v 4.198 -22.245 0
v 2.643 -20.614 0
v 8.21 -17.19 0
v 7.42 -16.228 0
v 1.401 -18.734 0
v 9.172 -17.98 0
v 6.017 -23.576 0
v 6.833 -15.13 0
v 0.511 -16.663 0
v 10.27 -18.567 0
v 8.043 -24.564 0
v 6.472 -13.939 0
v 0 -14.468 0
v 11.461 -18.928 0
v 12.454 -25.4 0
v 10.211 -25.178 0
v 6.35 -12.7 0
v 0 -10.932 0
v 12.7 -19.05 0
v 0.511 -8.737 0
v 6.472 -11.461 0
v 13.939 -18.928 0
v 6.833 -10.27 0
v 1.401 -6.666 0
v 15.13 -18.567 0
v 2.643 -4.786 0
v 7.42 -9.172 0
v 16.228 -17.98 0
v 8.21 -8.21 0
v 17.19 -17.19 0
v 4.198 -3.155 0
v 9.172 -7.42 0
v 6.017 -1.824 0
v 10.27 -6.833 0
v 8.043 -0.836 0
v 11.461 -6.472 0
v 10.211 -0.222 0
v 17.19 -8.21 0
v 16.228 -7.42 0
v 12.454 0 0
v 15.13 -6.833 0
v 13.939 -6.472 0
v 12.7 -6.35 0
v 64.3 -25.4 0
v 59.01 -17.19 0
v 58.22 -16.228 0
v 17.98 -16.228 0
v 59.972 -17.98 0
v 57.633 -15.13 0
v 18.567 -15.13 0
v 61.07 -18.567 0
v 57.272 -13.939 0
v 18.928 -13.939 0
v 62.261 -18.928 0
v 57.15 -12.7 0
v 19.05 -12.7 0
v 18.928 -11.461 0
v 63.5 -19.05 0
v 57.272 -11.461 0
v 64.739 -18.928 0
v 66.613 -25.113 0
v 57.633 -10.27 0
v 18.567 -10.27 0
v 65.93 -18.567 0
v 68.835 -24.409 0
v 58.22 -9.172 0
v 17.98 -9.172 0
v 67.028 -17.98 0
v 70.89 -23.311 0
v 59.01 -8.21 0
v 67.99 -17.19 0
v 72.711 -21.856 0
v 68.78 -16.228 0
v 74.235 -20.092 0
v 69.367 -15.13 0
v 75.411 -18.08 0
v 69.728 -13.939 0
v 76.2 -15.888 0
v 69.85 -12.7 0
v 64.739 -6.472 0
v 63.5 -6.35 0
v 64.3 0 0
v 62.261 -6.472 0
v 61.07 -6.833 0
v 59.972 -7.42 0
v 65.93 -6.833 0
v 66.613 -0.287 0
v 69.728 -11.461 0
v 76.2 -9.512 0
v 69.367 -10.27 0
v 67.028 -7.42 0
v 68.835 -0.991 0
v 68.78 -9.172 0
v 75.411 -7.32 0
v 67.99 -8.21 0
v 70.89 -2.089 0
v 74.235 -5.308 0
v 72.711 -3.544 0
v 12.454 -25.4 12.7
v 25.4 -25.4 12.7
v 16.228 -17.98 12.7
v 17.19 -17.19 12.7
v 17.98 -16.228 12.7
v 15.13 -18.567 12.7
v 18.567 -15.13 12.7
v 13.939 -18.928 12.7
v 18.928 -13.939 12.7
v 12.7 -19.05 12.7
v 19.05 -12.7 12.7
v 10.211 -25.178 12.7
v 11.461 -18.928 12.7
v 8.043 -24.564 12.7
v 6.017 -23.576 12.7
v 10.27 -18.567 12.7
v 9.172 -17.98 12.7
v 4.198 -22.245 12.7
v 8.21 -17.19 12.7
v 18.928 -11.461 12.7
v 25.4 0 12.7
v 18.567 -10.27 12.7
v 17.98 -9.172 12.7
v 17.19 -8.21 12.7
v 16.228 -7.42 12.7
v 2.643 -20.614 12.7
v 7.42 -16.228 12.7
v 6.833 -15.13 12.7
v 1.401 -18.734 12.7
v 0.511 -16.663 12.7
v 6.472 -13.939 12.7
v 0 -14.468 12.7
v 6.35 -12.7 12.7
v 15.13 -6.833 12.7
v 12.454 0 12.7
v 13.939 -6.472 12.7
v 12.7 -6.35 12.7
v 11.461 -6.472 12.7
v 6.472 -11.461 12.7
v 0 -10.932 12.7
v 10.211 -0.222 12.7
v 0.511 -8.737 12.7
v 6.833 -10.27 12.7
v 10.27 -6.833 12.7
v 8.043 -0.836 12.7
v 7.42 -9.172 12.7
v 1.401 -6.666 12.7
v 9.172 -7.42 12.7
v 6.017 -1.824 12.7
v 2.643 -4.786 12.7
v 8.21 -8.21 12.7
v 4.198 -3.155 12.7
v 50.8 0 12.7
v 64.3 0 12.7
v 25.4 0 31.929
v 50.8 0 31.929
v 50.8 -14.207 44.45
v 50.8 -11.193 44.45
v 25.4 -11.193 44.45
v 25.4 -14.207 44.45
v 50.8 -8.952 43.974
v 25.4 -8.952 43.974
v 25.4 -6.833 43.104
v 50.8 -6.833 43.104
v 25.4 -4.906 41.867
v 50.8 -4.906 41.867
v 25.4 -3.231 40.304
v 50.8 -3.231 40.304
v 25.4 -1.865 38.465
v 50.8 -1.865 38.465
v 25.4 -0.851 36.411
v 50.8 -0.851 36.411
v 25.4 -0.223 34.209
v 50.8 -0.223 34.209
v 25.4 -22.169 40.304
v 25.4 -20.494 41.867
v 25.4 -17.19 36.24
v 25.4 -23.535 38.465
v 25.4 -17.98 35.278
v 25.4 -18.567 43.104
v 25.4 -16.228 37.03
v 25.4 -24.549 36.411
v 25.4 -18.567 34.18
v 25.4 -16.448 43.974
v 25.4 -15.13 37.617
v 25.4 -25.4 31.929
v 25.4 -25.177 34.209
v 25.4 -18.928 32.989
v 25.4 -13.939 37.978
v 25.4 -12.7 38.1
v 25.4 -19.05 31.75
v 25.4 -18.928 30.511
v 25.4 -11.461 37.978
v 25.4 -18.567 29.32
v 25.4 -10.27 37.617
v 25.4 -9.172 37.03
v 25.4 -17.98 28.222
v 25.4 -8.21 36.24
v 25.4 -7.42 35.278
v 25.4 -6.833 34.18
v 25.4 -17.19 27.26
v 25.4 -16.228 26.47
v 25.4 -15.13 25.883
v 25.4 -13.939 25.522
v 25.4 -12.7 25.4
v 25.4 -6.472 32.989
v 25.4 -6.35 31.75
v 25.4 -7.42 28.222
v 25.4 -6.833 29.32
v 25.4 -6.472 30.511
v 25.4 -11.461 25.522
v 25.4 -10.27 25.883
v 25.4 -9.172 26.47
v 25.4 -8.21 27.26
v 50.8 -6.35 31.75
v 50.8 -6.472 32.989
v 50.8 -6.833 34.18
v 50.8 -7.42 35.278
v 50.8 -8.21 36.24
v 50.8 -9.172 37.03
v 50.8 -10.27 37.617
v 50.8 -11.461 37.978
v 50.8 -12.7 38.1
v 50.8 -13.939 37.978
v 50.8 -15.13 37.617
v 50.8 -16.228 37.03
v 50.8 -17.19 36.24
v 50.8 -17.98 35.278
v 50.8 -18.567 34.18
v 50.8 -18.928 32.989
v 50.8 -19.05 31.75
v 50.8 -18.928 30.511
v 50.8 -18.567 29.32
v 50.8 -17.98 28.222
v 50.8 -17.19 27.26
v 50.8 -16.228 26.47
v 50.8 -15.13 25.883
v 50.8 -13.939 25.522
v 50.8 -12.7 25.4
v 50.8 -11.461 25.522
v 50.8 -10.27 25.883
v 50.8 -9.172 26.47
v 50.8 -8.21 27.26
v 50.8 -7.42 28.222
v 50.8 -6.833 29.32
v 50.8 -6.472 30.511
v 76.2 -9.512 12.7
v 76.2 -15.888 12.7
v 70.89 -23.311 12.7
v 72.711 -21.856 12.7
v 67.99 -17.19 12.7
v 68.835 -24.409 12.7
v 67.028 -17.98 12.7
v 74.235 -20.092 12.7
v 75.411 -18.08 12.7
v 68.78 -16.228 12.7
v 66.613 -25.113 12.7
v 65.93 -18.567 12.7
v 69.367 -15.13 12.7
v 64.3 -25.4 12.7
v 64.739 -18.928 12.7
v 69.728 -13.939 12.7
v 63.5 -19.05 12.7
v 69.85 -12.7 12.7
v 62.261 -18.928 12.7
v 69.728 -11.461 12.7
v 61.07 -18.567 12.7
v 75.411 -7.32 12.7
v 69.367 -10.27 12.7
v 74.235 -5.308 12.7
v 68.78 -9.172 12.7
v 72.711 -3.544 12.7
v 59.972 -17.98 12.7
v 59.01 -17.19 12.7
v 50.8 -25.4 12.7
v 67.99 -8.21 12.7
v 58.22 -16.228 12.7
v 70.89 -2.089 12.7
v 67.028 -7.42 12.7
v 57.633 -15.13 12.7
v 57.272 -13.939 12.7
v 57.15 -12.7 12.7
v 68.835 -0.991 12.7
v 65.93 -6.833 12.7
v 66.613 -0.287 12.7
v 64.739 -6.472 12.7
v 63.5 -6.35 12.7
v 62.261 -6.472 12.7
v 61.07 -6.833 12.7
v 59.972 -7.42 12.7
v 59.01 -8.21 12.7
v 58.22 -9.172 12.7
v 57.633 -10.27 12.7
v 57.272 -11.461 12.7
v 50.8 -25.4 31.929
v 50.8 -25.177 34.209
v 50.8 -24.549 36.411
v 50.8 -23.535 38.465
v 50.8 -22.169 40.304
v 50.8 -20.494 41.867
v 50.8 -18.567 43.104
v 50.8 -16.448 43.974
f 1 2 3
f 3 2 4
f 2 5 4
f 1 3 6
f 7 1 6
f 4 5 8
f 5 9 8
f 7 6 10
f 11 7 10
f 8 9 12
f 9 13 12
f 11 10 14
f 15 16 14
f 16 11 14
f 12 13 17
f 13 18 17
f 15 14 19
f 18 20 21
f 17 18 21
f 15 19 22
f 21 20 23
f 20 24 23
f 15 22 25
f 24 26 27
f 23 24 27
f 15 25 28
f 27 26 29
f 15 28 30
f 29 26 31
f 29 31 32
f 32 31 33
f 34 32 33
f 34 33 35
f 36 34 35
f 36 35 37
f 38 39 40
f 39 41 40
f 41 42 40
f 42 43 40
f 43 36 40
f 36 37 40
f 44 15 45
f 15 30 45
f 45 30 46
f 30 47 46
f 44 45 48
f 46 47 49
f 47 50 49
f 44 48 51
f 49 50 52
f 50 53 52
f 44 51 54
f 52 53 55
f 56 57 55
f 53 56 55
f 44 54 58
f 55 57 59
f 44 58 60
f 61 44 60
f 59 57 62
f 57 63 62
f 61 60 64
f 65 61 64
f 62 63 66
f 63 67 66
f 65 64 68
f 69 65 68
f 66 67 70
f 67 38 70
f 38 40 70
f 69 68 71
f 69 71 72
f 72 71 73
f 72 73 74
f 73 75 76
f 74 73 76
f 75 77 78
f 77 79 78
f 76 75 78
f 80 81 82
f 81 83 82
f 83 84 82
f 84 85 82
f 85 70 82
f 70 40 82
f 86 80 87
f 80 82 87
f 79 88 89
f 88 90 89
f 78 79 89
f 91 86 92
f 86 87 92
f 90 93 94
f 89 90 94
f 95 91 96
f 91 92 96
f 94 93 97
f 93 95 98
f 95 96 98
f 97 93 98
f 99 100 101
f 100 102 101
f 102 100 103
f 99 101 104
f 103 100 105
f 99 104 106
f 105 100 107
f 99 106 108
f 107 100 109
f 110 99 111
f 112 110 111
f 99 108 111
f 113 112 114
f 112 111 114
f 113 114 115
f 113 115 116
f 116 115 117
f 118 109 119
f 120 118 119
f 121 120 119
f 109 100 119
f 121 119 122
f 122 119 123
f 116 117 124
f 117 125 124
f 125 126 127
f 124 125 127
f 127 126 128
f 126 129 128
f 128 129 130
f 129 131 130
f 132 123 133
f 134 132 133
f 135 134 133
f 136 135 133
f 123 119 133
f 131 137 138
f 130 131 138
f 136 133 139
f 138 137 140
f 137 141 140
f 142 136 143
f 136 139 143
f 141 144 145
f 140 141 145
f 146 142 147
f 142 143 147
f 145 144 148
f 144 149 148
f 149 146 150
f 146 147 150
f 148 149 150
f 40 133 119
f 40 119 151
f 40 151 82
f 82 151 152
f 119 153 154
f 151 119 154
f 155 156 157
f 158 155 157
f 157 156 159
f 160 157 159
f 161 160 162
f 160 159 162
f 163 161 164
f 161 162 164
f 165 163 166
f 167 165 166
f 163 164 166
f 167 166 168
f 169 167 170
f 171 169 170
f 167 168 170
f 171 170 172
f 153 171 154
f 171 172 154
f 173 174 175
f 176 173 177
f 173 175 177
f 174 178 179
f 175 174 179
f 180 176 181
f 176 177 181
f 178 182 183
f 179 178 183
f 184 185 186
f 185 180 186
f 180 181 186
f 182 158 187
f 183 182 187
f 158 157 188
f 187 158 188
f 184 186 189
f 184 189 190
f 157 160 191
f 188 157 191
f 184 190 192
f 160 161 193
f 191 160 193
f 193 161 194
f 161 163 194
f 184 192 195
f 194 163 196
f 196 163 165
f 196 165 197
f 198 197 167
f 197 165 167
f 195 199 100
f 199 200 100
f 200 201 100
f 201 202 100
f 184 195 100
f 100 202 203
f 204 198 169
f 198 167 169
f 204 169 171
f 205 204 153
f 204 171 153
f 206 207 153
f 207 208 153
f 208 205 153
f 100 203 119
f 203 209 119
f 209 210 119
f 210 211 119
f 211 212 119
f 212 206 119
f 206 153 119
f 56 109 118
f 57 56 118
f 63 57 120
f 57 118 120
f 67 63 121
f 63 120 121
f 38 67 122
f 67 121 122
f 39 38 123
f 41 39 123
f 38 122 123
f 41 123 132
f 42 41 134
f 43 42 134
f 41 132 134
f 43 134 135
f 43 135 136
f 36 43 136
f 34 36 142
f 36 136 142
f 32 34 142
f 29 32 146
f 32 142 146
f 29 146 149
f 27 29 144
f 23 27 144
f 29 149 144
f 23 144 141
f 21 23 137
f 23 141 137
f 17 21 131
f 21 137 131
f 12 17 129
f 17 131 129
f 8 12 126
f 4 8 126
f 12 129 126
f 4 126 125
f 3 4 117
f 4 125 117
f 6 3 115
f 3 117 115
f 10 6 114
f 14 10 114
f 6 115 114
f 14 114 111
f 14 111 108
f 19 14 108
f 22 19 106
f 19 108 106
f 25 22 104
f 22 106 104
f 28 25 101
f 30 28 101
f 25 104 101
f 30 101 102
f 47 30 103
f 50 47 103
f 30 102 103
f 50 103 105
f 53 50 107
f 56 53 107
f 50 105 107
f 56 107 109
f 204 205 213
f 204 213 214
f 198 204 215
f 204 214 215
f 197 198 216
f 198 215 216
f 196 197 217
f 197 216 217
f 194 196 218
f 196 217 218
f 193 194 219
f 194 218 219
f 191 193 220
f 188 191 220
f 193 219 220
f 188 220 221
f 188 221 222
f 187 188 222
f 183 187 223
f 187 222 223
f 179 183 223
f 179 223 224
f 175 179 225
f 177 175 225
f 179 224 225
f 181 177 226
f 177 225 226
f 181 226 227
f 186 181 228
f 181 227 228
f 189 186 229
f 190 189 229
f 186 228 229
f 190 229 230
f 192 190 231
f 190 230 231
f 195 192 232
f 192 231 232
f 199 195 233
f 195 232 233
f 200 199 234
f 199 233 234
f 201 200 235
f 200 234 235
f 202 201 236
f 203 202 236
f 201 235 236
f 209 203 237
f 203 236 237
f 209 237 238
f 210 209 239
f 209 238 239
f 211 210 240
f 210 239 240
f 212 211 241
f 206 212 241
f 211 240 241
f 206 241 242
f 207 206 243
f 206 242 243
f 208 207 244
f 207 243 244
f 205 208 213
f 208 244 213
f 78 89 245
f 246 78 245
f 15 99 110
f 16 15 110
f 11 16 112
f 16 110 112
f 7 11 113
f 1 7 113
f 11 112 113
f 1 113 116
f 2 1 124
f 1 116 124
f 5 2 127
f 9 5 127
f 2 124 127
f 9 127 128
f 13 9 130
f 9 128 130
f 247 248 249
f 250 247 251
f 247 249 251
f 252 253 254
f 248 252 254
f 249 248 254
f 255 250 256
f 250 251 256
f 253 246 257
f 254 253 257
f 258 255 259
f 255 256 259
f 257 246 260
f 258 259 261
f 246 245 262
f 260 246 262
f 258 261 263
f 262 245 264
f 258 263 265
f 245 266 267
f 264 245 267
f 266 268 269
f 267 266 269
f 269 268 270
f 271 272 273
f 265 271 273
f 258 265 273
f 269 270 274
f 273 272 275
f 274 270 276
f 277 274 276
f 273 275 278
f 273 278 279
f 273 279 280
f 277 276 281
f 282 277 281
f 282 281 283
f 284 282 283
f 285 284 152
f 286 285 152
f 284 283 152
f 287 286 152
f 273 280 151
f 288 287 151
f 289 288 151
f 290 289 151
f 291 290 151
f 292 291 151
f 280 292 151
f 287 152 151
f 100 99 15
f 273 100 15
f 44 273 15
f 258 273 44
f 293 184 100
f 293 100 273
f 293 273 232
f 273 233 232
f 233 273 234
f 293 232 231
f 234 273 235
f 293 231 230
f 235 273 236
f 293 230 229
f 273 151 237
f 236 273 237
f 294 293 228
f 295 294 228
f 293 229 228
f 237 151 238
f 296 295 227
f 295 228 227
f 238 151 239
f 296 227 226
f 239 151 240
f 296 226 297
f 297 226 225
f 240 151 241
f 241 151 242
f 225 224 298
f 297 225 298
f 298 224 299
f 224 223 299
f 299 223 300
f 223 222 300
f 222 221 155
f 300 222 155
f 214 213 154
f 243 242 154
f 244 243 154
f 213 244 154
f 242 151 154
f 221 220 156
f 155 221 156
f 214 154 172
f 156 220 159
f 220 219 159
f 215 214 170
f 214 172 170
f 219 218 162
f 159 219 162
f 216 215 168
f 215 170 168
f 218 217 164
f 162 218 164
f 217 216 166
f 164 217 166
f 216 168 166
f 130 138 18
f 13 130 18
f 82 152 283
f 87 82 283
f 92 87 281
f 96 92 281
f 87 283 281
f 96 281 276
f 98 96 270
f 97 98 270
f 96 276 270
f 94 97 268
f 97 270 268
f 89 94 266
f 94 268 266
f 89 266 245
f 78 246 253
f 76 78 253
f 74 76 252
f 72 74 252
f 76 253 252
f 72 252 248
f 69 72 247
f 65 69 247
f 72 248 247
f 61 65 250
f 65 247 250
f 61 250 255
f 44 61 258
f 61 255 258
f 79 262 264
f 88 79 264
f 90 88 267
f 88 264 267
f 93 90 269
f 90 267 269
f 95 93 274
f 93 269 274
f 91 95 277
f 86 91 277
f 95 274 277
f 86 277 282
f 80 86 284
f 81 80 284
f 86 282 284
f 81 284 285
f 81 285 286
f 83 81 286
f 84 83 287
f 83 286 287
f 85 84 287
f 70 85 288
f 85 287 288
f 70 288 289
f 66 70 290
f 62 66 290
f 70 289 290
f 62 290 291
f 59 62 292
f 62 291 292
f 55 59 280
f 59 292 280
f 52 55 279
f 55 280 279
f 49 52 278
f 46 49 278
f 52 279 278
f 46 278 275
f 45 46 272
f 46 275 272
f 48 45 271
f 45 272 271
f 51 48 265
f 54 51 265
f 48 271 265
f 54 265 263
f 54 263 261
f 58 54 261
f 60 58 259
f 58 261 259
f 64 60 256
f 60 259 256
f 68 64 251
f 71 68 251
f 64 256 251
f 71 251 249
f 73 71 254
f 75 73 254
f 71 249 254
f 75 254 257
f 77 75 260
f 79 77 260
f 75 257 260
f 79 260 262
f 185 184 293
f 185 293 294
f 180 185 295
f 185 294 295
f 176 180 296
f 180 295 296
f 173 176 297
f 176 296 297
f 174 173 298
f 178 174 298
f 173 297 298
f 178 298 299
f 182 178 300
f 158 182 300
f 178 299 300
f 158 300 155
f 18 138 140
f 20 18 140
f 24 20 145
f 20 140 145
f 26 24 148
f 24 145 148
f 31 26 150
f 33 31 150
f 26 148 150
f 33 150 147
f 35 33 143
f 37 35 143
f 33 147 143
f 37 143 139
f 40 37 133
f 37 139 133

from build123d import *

# Parameters (mm, degrees)
F1_DEPTH = 25.4
F2_R     = 6.35
F3_DEPTH = 25.4
F4_R     = 6.35
F5_DEPTH = 12.7
F6_R     = 6.35
F7_DEPTH = 12.7


with BuildPart() as f1:
    # F0 (on Front) → F1 (new body)
    with BuildSketch(Plane.XZ):
        Polygon((0, 12.7), (0, 0), (76.2, 0), (76.2, 12.7), (50.8, 12.7), (50.8, 44.45), (25.4, 44.45), (25.4, 12.7), align=None)
    extrude(amount=F1_DEPTH)

    # F2 (on face) → F3 (cut)
    with BuildSketch(Plane.YZ.offset(50.8)):
        with Locations((-12.7, 31.75)):
            Circle(F2_R)
        with BuildLine():
            ThreePointArc((-11.1926886687, 44.45), (-3.231292005, 40.303582652), (0, 31.9288966496))
            Line((0, 31.9288966496), (0, 44.45))
            Line((0, 44.45), (-11.1926886687, 44.45))
        make_face()
        with BuildLine():
            ThreePointArc((-25.4, 31.9288966496), (-22.168707995, 40.303582652), (-14.2073113313, 44.45))
            Line((-14.2073113313, 44.45), (-25.4, 44.45))
            Line((-25.4, 44.45), (-25.4, 31.9288966496))
        make_face()
    extrude(amount=-F3_DEPTH, mode=Mode.SUBTRACT)

    # F4 (on face) → F5 (cut)
    with BuildSketch(Plane.XY.offset(12.7)):
        with Locations((63.5, -12.7)):
            Circle(F4_R)
        with BuildLine():
            ThreePointArc((64.3000455197, 0), (71.8337545006, -2.7749851952), (76.2, -9.512433828))
            Line((76.2, -9.512433828), (76.2, 0))
            Line((76.2, 0), (64.3000455197, 0))
        make_face()
        with BuildLine():
            ThreePointArc((76.2, -15.887566172), (71.8337545006, -22.6250148048), (64.3000455197, -25.4))
            Line((64.3000455197, -25.4), (76.2, -25.4))
            Line((76.2, -25.4), (76.2, -15.887566172))
        make_face()
    extrude(amount=-F5_DEPTH, mode=Mode.SUBTRACT)

    # F6 (on face) → F7 (cut)
    with BuildSketch(Plane.XY.offset(12.7)):
        with Locations((12.7, -12.7)):
            Circle(F6_R)
        with BuildLine():
            ThreePointArc((0, -10.9318505954), (4.1984404998, -3.1550374284), (12.4538305262, 0))
            Line((12.4538305262, 0), (0, 0))
            Line((0, 0), (0, -10.9318505954))
        make_face()
        with BuildLine():
            ThreePointArc((12.4538305262, -25.4), (4.1984404998, -22.2449625716), (0, -14.4681494046))
            Line((0, -14.4681494046), (0, -25.4))
            Line((0, -25.4), (12.4538305262, -25.4))
        make_face()
    extrude(amount=-F7_DEPTH, mode=Mode.SUBTRACT)


solid = f1.part
